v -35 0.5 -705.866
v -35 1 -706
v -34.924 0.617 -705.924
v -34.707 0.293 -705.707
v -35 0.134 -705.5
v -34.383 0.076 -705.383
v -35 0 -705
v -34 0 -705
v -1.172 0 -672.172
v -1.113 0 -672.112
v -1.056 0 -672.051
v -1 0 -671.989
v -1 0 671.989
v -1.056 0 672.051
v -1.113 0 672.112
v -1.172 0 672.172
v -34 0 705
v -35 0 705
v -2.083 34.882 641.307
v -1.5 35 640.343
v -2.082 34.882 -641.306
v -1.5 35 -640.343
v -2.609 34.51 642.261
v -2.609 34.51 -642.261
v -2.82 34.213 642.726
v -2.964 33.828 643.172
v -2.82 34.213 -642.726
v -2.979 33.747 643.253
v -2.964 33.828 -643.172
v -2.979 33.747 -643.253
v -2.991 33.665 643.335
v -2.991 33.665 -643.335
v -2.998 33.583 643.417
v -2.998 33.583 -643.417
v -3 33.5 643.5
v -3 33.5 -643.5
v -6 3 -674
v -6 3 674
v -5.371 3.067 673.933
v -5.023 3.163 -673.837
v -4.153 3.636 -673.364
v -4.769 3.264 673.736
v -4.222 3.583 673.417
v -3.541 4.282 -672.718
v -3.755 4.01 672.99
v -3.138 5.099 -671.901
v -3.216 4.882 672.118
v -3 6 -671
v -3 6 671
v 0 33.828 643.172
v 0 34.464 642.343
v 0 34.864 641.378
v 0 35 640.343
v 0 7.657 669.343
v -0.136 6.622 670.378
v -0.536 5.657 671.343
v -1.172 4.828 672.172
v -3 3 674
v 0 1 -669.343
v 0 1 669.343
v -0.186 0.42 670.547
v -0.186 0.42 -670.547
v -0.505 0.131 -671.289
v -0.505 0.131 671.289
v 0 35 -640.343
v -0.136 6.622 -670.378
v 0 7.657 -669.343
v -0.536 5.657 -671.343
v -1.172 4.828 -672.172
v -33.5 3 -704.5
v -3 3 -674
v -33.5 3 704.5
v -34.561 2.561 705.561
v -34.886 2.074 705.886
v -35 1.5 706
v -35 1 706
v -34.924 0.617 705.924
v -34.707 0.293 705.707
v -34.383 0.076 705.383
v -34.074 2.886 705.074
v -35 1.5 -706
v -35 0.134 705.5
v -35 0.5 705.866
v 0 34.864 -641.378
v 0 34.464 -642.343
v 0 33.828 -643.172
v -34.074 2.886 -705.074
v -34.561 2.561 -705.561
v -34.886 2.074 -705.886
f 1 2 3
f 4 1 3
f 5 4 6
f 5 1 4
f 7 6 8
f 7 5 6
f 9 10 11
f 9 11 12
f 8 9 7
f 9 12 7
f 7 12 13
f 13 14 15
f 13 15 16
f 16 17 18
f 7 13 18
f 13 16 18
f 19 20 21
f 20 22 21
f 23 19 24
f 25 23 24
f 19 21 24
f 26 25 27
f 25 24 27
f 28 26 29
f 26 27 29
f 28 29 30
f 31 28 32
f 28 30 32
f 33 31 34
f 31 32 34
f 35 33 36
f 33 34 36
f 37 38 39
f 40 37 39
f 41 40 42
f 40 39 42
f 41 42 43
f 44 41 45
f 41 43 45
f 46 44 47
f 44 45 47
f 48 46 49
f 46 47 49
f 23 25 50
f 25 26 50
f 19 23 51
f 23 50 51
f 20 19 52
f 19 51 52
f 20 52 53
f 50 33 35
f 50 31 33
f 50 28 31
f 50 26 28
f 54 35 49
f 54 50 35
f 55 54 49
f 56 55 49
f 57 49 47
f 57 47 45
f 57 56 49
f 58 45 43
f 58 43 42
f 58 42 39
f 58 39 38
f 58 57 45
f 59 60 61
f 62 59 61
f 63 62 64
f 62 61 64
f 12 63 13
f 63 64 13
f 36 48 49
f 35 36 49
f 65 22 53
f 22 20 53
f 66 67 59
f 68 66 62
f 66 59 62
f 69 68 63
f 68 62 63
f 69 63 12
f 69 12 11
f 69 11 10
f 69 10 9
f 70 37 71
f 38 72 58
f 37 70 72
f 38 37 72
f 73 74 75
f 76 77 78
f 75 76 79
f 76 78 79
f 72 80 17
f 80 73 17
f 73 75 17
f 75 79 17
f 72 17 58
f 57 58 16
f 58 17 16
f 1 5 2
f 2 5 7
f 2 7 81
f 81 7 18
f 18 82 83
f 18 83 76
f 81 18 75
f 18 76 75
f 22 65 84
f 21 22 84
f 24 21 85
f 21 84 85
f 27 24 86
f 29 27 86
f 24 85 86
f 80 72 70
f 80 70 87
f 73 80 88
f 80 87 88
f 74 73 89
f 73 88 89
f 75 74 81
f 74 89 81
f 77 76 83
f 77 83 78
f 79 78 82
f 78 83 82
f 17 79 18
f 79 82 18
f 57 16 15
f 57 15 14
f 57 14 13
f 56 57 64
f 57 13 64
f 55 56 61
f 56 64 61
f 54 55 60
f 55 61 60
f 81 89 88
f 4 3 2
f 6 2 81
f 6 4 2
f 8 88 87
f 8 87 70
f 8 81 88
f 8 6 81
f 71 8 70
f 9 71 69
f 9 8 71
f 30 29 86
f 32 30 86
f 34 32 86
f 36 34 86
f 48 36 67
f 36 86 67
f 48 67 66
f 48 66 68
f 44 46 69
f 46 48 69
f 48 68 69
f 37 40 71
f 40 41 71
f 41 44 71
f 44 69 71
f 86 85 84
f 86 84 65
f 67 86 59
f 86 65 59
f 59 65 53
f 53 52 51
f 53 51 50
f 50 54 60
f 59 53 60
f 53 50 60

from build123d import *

# Parameters (mm, degrees)
BOSS_EXTRUDE1_DEPTH = 706
FILLET1_R           = 1.5
CUT_EXTRUDE1_DEPTH  = 708.733000502
CUT_EXTRUDE2_DEPTH  = 10
FILLET2_R           = 4
FILLET3_R           = 4
FILLET4_R           = 4
FILLET5_R           = 4
CUT_EXTRUDE3_DEPTH  = 10


with BuildPart() as part:
    # Sketch1 → Boss-Extrude1 (new, symmetric)
    with BuildSketch(Plane.XY):
        with BuildLine():
            Line((-1, 0), (-35, 0))
            Line((-35, 0), (-35, 3))
            Line((-35, 3), (-6, 3))
            ThreePointArc((-6, 3), (-3.878679656, 3.878679656), (-3, 6))
            Line((-3, 6), (-3, 35))
            Line((-3, 35), (0, 35))
            Line((0, 35), (0, 1))
            ThreePointArc((0, 1), (-0.292893219, 0.292893219), (-1, 0))
        make_face()
    extrude(amount=BOSS_EXTRUDE1_DEPTH, both=True)

    # Fillet1
    fillet1_edges = [part.edges().sort_by_distance(p)[0] for p in [
        (-35, 3, 0),
        (-3, 35, 0),
    ]]
    fillet(fillet1_edges, radius=FILLET1_R)

    # Sketch2 → Cut-Extrude1 (cut, through all)
    with BuildSketch(Plane.XZ):
        Polygon((-35, -706), (0, -671), (0, -706), align=None)
    cut_extrude1 = extrude(amount=-CUT_EXTRUDE1_DEPTH, mode=Mode.SUBTRACT)

    # Sketch3 → Cut-Extrude2 (cut)
    with BuildSketch(Plane(origin=(0, 0, 0), x_dir=(0, 0, -1), z_dir=(1, 0, 0))):
        Polygon((642, 35), (674, 3), (706, 3), (674, 35), align=None)
    cut_extrude2 = extrude(amount=-CUT_EXTRUDE2_DEPTH, mode=Mode.SUBTRACT)

    # Mirror1: Cut-Extrude1, Cut-Extrude2 across plane
    add(cut_extrude1.mirror(Plane.XY), mode=Mode.SUBTRACT)
    add(cut_extrude2.mirror(Plane.XY), mode=Mode.SUBTRACT)

    # Fillet2
    # the kernel refuses this fillet: 4 mm, written as the material it takes off along each edge
    with BuildSketch(Plane(origin=(4.142135624, 35, -642), x_dir=(0, 0, 1), z_dir=(-1, 0, 0))) as fillet2_piece_1:
        with BuildLine():
            CenterArc((FILLET2_R * 0.414213562373, -FILLET2_R), FILLET2_R, 90, 45)
            Line((-FILLET2_R * 0.292893218813, -FILLET2_R * 0.292893218813), (0, 0))
            Line((0, 0), (FILLET2_R * 0.414213562373, 0))
        make_face()
    extrude(amount=9.784271247, mode=Mode.SUBTRACT)

    # Fillet3
    # the kernel refuses this fillet: 4 mm, written as the material it takes off along each edge
    with BuildSketch(Plane(origin=(0, -3.142135624, -671), x_dir=(-0.707106781186569, 0, -0.707106781186526), z_dir=(0, 1, 0))) as fillet3_piece_1:
        with BuildLine():
            CenterArc((FILLET3_R * 0.414213562373, FILLET3_R), FILLET3_R, 225, 45)
            Line((-FILLET3_R * 0.292893218813, FILLET3_R * 0.292893218813), (0, 0))
            Line((0, 0), (FILLET3_R * 0.414213562373, 0))
        make_face()
    extrude(amount=13.284271247, mode=Mode.SUBTRACT)

    # Fillet4
    # the kernel refuses this fillet: 4 mm, written as the material it takes off along each edge
    with BuildSketch(Plane(origin=(0, -3.142135624, 671), x_dir=(-0.707106781186569, 0, 0.707106781186526), z_dir=(0, 1, 0))) as fillet4_piece_1:
        with BuildLine():
            CenterArc((FILLET4_R * 0.414213562373, -FILLET4_R), FILLET4_R, 90, 45)
            Line((-FILLET4_R * 0.292893218813, -FILLET4_R * 0.292893218813), (0, 0))
            Line((0, 0), (FILLET4_R * 0.414213562373, 0))
        make_face()
    extrude(amount=13.284271247, mode=Mode.SUBTRACT)

    # Fillet5
    # the kernel refuses this fillet: 4 mm, written as the material it takes off along each edge
    with BuildSketch(Plane(origin=(4.142135624, 35, 642), x_dir=(0, -0.7071067811865432, 0.7071067811865518), z_dir=(-1, 0, 0))) as fillet5_piece_1:
        with BuildLine():
            CenterArc((FILLET5_R * 0.414213562373, -FILLET5_R), FILLET5_R, 90, 45)
            Line((-FILLET5_R * 0.292893218813, -FILLET5_R * 0.292893218813), (0, 0))
            Line((0, 0), (FILLET5_R * 0.414213562373, 0))
        make_face()
    extrude(amount=9.784271247, mode=Mode.SUBTRACT)

    # Sketch4 → Cut-Extrude3 (cut)
    with BuildSketch(Plane.ZY.offset(35)):
        Polygon((711.147996861, -1.5), (711.147996861, 1.5), (706, 1.5), (706, 1), (706, 0), (705, 0), (700.876909591, 0), (700.876909591, -1.5), align=None)
        with BuildLine():
            Line((706, 0), (706, 1))
            ThreePointArc((706, 1), (705.707106781, 0.292893219), (705, 0))
            Line((705, 0), (706, 0))
        make_face()
    cut_extrude3 = extrude(amount=-CUT_EXTRUDE3_DEPTH, mode=Mode.SUBTRACT)

    # Mirror2: Cut-Extrude3 across plane
    add(cut_extrude3.mirror(Plane.XY), mode=Mode.SUBTRACT)


solid = part.part
